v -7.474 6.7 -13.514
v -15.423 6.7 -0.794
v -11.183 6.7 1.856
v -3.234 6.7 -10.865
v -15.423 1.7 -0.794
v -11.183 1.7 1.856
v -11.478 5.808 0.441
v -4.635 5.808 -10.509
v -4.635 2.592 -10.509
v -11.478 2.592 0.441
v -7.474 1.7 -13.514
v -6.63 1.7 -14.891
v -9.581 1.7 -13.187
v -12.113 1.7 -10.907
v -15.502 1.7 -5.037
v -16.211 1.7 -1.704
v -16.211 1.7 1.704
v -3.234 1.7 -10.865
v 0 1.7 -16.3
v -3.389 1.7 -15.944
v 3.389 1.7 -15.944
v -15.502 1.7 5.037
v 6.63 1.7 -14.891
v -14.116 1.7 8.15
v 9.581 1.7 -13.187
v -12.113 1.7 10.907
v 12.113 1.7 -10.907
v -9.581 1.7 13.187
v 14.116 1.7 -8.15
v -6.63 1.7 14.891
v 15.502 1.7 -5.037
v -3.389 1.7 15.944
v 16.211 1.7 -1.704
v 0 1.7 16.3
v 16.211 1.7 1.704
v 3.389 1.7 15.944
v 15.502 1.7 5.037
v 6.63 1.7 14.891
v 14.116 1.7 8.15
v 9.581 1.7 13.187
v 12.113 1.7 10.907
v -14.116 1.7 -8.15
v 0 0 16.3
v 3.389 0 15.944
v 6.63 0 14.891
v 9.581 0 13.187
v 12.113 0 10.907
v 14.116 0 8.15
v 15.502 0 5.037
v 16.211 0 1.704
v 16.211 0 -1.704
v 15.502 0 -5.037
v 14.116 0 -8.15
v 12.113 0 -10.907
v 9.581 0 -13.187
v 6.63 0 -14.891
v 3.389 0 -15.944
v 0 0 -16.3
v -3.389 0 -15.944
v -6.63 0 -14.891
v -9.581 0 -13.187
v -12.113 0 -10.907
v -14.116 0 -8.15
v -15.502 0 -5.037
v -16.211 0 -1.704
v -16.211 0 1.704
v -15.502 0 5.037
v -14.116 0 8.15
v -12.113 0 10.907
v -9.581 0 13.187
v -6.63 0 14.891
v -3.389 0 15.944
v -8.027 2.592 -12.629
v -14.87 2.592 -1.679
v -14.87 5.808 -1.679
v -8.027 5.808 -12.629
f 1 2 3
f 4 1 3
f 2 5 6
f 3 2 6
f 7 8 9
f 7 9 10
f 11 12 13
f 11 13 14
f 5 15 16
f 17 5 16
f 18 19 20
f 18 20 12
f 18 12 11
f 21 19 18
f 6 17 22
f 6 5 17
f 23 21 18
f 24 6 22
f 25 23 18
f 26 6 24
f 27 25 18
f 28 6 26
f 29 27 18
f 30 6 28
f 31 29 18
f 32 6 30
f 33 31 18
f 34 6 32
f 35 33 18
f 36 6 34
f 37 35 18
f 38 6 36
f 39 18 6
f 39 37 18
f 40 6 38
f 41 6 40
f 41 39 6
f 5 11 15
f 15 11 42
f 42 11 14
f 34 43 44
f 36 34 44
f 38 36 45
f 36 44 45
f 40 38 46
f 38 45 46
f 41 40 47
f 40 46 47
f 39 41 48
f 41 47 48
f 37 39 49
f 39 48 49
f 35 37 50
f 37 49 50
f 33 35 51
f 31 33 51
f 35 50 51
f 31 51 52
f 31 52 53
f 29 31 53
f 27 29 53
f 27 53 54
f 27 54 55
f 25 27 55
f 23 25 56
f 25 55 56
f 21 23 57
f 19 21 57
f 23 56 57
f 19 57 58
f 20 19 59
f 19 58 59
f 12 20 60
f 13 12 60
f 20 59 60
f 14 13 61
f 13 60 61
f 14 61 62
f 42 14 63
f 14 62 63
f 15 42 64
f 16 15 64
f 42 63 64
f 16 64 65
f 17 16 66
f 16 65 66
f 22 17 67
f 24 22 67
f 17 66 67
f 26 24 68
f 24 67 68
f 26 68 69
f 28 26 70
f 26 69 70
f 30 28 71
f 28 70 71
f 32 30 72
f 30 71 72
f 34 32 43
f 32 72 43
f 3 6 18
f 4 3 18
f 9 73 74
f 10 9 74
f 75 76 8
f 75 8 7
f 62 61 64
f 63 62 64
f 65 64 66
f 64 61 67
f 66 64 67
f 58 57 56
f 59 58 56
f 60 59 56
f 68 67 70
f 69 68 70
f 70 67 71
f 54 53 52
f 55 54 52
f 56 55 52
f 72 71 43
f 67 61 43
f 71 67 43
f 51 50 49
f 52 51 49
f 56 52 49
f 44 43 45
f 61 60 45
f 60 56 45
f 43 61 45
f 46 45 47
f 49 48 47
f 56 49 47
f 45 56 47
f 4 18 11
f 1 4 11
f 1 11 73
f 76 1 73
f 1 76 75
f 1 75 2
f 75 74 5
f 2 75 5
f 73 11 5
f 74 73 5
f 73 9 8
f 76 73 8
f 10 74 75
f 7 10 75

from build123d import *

# Parameters (mm, degrees)
SKETCH1_R           = 16.3
BOSS_EXTRUDE1_DEPTH = 1.7
BOSS_EXTRUDE2_DEPTH = 5
SKETCH3_W           = 12.912487974
SKETCH3_H           = 3.215299838
CUT_EXTRUDE1_DEPTH  = 4


with BuildPart() as part:
    # Sketch1 → Boss-Extrude1 (new body)
    with BuildSketch(Plane(origin=(0, 0, 0), x_dir=(1, 0, 0), z_dir=(0, 1, 0))):
        with Locations(Location((0, 0, 0), (0, 0, 270))):
            Circle(SKETCH1_R)
    extrude(amount=BOSS_EXTRUDE1_DEPTH)

    # Sketch2 → Boss-Extrude2 (add)
    with BuildSketch(Plane(origin=(0, 1.7, 0), x_dir=(1, 0, 0), z_dir=(0, 1, 0))):
        Polygon((-7.474254816, 13.514270788), (-15.42304378, 0.793549346), (-11.182803299, -1.856046975), (-3.234014336, 10.864674467), align=None)
    extrude(amount=BOSS_EXTRUDE2_DEPTH)

    # Sketch3 → Cut-Extrude1 (cut)
    with BuildSketch(Plane(origin=(-11.448649298, 0, -7.153910067), x_dir=(-0.5299192642332052, 0, 0.8480480961564258), z_dir=(-0.8480480961564258, 0, -0.5299192642332052))):
        with Locations((0, 4.2)):
            Rectangle(SKETCH3_W, SKETCH3_H)
    extrude(amount=-CUT_EXTRUDE1_DEPTH, mode=Mode.SUBTRACT)


solid = part.part
